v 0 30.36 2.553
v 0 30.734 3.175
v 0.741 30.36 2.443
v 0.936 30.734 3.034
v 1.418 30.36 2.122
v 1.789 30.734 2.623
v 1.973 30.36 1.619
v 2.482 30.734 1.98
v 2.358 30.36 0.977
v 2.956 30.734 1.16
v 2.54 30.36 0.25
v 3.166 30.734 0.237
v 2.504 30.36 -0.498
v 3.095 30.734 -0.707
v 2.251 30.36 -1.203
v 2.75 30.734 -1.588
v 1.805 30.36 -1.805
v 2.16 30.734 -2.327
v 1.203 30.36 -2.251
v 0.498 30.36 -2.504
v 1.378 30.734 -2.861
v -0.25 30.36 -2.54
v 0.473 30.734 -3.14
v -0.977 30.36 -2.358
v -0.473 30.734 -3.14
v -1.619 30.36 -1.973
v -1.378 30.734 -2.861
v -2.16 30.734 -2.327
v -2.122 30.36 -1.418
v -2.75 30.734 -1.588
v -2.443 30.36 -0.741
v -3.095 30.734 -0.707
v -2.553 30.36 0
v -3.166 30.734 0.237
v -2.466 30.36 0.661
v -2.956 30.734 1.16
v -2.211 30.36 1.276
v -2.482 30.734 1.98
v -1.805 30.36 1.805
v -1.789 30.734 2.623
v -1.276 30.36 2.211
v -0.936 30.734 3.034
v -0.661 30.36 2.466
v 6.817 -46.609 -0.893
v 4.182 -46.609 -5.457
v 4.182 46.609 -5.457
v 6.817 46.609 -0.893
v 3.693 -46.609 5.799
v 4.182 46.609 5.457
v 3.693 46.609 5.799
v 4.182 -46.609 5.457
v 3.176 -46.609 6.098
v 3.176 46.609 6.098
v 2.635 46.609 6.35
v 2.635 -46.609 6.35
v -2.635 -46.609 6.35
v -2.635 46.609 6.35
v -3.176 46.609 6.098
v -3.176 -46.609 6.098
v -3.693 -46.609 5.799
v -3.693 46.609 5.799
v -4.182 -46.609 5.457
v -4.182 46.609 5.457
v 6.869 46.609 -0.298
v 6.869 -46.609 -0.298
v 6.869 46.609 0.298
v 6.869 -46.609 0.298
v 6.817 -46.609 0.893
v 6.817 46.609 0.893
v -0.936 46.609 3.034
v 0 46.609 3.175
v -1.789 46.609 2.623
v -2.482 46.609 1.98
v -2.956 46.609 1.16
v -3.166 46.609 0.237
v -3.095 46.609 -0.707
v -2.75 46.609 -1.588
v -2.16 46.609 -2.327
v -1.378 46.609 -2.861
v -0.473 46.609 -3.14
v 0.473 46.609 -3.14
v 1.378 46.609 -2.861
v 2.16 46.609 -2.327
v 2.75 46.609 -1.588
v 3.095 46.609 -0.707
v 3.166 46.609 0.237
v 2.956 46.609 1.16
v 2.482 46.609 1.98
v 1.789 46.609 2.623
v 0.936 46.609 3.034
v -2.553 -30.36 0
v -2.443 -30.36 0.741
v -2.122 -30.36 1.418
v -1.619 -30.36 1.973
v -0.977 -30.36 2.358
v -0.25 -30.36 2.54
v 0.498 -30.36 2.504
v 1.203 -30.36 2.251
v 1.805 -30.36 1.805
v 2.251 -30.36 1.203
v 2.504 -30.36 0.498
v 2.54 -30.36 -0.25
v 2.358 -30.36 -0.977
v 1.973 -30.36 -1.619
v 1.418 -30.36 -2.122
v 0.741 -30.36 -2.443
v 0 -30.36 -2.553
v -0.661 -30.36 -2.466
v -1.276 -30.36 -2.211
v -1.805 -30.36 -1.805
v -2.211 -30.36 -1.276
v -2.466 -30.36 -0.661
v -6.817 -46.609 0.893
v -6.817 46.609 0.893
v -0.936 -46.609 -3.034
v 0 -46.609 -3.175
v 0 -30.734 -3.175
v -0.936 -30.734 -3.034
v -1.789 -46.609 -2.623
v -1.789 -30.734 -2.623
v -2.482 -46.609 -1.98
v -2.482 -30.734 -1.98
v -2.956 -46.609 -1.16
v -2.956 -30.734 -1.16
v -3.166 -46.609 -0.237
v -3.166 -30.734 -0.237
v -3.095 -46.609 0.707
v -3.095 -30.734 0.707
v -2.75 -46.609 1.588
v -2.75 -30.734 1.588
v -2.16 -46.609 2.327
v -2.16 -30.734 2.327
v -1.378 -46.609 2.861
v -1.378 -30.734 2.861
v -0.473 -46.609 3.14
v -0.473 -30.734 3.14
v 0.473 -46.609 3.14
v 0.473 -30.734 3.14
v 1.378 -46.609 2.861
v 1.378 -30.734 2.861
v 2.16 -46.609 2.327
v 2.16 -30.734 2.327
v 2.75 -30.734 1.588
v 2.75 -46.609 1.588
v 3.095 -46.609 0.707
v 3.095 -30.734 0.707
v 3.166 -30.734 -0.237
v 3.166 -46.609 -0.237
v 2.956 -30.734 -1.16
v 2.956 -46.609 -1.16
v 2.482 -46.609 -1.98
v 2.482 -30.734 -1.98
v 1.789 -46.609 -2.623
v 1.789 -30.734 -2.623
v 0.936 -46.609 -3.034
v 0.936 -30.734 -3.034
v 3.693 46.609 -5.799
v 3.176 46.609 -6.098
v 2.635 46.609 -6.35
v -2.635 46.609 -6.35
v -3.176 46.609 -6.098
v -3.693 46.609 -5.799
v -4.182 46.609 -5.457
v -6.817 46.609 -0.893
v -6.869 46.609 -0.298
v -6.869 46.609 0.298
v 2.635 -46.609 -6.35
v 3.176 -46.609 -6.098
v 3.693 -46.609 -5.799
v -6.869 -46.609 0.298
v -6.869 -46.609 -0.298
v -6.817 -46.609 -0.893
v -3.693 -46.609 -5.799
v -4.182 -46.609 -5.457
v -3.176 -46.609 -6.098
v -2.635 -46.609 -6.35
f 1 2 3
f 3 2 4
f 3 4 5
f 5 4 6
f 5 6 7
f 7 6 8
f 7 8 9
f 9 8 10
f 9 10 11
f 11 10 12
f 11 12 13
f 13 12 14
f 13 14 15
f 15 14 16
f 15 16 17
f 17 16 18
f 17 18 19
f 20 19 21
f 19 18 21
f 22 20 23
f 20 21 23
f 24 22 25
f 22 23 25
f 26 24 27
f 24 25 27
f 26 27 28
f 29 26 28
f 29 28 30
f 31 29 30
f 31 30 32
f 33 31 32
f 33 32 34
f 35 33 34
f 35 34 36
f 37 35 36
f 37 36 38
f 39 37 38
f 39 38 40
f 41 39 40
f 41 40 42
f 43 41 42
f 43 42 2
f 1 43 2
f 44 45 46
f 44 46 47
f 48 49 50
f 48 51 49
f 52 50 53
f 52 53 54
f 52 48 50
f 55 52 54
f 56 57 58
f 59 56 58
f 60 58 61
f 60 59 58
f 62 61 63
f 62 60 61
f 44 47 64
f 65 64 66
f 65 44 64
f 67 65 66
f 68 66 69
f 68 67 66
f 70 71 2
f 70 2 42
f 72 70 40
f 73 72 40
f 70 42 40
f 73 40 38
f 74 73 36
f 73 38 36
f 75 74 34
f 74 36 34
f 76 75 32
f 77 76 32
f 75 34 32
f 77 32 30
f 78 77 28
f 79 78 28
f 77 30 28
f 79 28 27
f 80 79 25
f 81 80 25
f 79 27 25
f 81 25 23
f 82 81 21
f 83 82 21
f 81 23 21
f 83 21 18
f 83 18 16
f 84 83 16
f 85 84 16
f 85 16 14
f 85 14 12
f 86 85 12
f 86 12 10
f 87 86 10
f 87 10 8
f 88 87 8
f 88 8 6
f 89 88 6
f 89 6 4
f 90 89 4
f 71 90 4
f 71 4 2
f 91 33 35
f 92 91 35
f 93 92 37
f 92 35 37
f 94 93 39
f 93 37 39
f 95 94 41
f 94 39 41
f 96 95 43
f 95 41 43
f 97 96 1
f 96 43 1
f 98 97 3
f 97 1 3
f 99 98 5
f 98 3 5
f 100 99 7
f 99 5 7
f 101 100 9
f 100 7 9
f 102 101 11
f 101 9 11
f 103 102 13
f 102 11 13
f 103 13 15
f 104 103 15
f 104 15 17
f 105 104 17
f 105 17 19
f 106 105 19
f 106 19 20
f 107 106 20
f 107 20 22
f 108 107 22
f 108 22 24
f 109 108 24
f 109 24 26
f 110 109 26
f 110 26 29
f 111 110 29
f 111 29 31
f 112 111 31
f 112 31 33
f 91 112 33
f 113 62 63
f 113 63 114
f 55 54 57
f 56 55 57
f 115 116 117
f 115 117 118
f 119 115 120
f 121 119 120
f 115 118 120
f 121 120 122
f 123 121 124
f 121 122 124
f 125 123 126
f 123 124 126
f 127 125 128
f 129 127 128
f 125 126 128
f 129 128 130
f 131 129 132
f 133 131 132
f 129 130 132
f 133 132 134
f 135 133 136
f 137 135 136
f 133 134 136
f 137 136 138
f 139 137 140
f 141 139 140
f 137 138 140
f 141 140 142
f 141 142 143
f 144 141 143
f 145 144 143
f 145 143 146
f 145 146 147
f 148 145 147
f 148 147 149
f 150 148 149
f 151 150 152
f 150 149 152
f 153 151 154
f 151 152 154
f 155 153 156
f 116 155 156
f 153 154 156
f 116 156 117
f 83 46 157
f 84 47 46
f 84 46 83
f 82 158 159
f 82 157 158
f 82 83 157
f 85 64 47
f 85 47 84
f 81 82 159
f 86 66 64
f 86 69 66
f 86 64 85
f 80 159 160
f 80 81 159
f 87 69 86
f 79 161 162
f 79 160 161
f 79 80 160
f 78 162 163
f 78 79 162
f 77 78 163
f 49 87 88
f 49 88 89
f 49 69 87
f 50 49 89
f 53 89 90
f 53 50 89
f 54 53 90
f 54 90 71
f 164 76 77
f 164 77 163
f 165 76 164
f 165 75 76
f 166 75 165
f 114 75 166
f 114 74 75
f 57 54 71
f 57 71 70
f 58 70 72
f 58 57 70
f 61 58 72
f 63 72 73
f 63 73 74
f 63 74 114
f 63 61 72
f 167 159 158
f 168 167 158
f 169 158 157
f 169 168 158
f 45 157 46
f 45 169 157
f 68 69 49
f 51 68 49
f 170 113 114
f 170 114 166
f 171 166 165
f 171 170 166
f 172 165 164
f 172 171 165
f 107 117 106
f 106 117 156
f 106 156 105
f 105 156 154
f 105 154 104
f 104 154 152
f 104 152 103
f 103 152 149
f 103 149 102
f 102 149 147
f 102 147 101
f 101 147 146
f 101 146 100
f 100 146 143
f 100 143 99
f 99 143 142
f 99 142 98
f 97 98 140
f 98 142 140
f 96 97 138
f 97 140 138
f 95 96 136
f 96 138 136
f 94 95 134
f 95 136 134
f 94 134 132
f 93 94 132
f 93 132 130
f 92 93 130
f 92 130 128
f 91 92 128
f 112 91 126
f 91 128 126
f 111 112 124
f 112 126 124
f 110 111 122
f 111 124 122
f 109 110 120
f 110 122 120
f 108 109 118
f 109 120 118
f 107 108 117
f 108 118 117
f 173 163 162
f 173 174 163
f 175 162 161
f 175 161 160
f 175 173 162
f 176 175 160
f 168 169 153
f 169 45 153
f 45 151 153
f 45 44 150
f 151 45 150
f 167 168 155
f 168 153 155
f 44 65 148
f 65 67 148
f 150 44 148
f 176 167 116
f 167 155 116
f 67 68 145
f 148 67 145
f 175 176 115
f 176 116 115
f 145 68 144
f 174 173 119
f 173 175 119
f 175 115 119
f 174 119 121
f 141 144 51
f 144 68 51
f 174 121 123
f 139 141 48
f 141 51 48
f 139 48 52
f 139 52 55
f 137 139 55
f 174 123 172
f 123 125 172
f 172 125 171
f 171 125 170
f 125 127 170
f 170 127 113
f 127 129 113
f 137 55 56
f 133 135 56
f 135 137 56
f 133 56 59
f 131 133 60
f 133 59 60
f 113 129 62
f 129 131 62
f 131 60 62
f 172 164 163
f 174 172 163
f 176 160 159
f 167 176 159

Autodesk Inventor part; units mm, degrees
ref_plane "YZ Plane" through (0, 0, 0) normal (1, 0, 0) x (0, 1, 0)
ref_plane "XZ Plane" through (0, 0, 0) normal (0, 1, 0) x (-1, 0, 0)
ref_plane "XY Plane" through (0, 0, 0) normal (0, 0, 1) x (1, 0, 0)
sketch "Sketch1" plane through (0, 0, 0) normal (0, 1, 0) x (-1, 0, 0)
  line L0 (-7.3323, 0) -> (-3.6662, 6.35)
  line L1 (-3.6662, 6.35) -> (3.6662, 6.35)
  line L2 (3.6662, 6.35) -> (7.3323, 0)
  line L3 (7.3323, 0) -> (3.6662, -6.35)
  line L4 (3.6662, -6.35) -> (-3.6662, -6.35)
  line L5 (-3.6662, -6.35) -> (-7.3323, 0)
  circle A0 centre (0, 0) radius 6.875
  circle A1 centre (0, 0) radius 6.35
  line L6 (-2.7496, -4.7625) -> (2.7496, -4.7625)
  line L7 (2.7496, -4.7625) -> (5.4993, 0)
  line L8 (5.4993, 0) -> (2.7496, 4.7625)
  line L9 (2.7496, 4.7625) -> (-2.7496, 4.7625)
  line L10 (-2.7496, 4.7625) -> (-5.4993, 0)
  line L11 (-5.4993, 0) -> (-2.7496, -4.7625)
  circle A2 centre (0, 0) radius 4.7625
  circle A3 centre (0, 0) radius 5.125
  circle A4 centre (0, 0) radius 9.525
  circle A5 centre (0, 0) radius 5.9436
  circle A6 centre (0, 0) radius 2.5527
  circle A7 centre (0, 0) radius 2.0193
  circle A8 centre (0, 0) radius 3.175
  circle A9 centre (0, 0) radius 8.7313
  point P0 (-4.1818, 5.457)
  point P1 (-2.635, 6.35)
  point P2 (-6.8168, -0.893)
  point P3 (-6.8168, 0.893)
  point P4 (-2.635, -6.35)
  point P5 (-4.1818, -5.457)
  point P6 (4.1818, -5.457)
  point P7 (2.635, -6.35)
  point P8 (6.8168, -0.893)
  point P9 (6.8168, 0.893)
  point P10 (2.635, 6.35)
  point P11 (4.1818, 5.457)
  point P12 (3.1778, -4.0208)
  point P13 (1.8932, -4.7625)
  point P14 (5.071, -0.7417)
  point P15 (5.071, 0.7417)
  point P16 (1.8932, 4.7625)
  point P17 (3.1778, 4.0208)
  point P18 (-3.1778, 4.0208)
  point P19 (-1.8932, 4.7625)
  point P20 (-5.071, -0.7417)
  point P21 (-5.071, 0.7417)
  point P22 (-1.8932, -4.7625)
  point P23 (-3.1778, -4.0208)
  dimension "d0" = 12.7
  dimension "d1" = 13.75
  dimension "d2" = 12.7
  dimension "d3" = 9.525
  dimension "d4" = 10.25
  dimension "d5" = 19.05
  dimension "d6" = 11.8872
  dimension "d7" = 5.1054
  dimension "d8" = 4.0386
  dimension "d9" = 6.35
  dimension "d153" = 0.7937
extrude "BaseProfile625Round" add sketch "Sketch1" along normal mid plane 93.218 contours L0 A0 L5 | A0 L0 | L0 A1 L5 A0 | L5 A0 | L0 A0 L1 A1 | A1 | L0 L1 A0 | A1 L4 A0 L5 | A0 L4 L5 | L1 A0 | L1 A0 L2 A1 | A1 L3 A0 L4 | L4 A0 | L1 L2 A0 | L2 A0 | L2 A0 L3 A1 | A0 L3 L4 | L3 A0 | L2 L3 A0 | L11 A3 L6 | A3 L11 A2 L6 | L6 A3 | A3 L11 | A2 L7 A3 L6 | A2 | A3 L7 L6 | L11 A3 L10 A2 | L11 L10 A3 | L7 A3 | A2 L8 A3 L7 | L10 A3 | L10 A3 L9 A2 | A3 L8 L7 | L10 L9 A3 | L9 A3 | L9 A3 L8 A2 | L8 A3 | L9 L8 A3 | A4 | A5 | A6 | A7 | A8 | A9
extrude "BaseProfileRoundTube" [suppressed]
extrude "BaseProfile500Hex" [suppressed]
extrude "BaseProfile500Thunderhex" cut sketch "Sketch1" along normal mid plane 914.4 contours L0 A0 L5 | A0 L0 | L5 A0 | L0 L1 A0 | A0 L4 L5 | L1 A0 | L4 A0 | L1 L2 A0 | L2 A0 | A0 L3 L4 | L3 A0 | L2 L3 A0 | A4 | A9
extrude "BaseProfile500Round" [suppressed]
extrude "BaseProfile375Hex" [suppressed]
extrude "BaseProfile375Thunderhex" [suppressed]
extrude "BaseProfile375Round" [suppressed]
extrude "TopShaftProfile1Hex500" [suppressed]
extrude "TopShaftProfile1ThunderHex500" [suppressed]
extrude "TopShaftProfile1Round500" [suppressed]
extrude "TopShaftProfile1Hex375" [suppressed]
extrude "TopShaftProfile1ThunderHex375" [suppressed]
extrude "TopShaftProfile1Round375" [suppressed]
extrude "TopShaftProfile2ThunderHex500" [suppressed]
extrude "TopShaftProfile2Round500" [suppressed]
extrude "TopShaftProfile2Hex375" [suppressed]
extrude "TopShaftProfile2ThunderHex375" [suppressed]
extrude "TopShaftProfile2Round375" [suppressed]
sketch "Sketch2" plane through (0, 0, 0) normal (1, 0, 0) x (0, 1, 0)
  line L0 (-40.8112, 0) -> (47.9537, 0) projected
  line L1 (0, -2.6658) -> (0, 15.9951) projected
  line L2 (53.7515, 4.4704) -> (54.8945, 4.4704)
  line L3 (54.8945, 4.4704) -> (54.8945, 4.7625)
  line L4 (54.8945, 4.7625) -> (55.974, 4.7625)
  line L5 (55.974, 4.7625) -> (56.482, 4.2545)
  line L6 (56.482, 4.2545) -> (56.482, 0)
  line L7 (53.7515, 4.4704) -> (53.7515, 0) construction
  line L8 (53.7515, 4.4704) -> (53.7515, 4.7625)
  line L9 (53.7515, 4.7625) -> (46.609, 4.7625)
  line L10 (46.609, 4.7625) -> (46.609, 0)
  line L11 (46.609, 0) -> (56.482, 0)
  line L12 (-46.609, 5.9436) -> (-47.752, 5.9436)
  line L13 (-47.752, 5.9436) -> (-47.752, 6.35)
  line L14 (-47.752, 6.35) -> (-48.8315, 6.35)
  line L15 (-48.8315, 6.35) -> (-49.3395, 5.842)
  line L16 (-49.3395, 5.842) -> (-49.3395, 0)
  line L17 (-46.609, 5.9436) -> (-46.609, 0) construction
  line L18 (-46.609, 5.9436) -> (-46.609, 6.35)
  line L19 (-46.609, 6.35) -> (-46.609, 6.35)
  line L20 (-46.609, 6.35) -> (-46.609, 0)
  line L21 (-46.609, 0) -> (-49.3395, 0)
  line L22 (0, 0) -> (0, 13.3292)
  line L23 (46.609, 0) -> (46.609, 4.7625)
  point P0 (25.4, 5.9436)
  point P1 (-49.3395, 0)
  point P2 (-46.609, 0)
  point P3 (30.955, 4.7625)
  point P4 (-17.4625, 6.2865)
  point P5 (25.4, 4.7625)
  point P6 (19.4005, 4.7625)
  point P7 (-25.4, 4.7625)
  point P8 (-26.543, 4.7625)
  dimension "TopBearingRoundDia2" = 9.525
  dimension "d65" = 45
  dimension "RetainingRingChamferSize2" = 0.508
  dimension "d72" = 46.609
  dimension "TopSnapRingDia2" = 8.9408
  dimension "d119" = 0.508
  dimension "d120" = 45
  dimension "d135" = 46.609
  dimension "d138" = 56.482
  dimension "d139" = 54.8945
  dimension "d140" = 53.7515
  dimension "d141" = 11.8872
  dimension "d142" = 12.7
  dimension "d143" = 47.752
  dimension "d144" = 46.609
  dimension "d145" = 49.3395
revolve "TopRetentionGroove&BearingRound" [suppressed]
sketch "Sketch3" plane through (0, 46.609, 0) normal (0, 1, 0) x (1, 0, 0)
  point P0 (0, 0)
  point P1 (0, 0)
hole "TopShaftTappedHole" at (0, 46.609, 0) direction (0, -1, 0) diameter 6.35 depth 15.875 tip angle 118
thread "TopShaftThread" size "1/4-20 UNC" class "2B" standard "ANSI Unified Screw Threads" length 12.7
extrude "BottomShaftProfile1Hex500" [suppressed]
extrude "BottomShaftProfile1ThunderHex500" [suppressed]
extrude "BottomShaftProfile1Round500" [suppressed]
extrude "BottomShaftProfile1Hex375" [suppressed]
extrude "BottomShaftProfile1ThunderHex375" [suppressed]
extrude "BottomShaftProfile2ThunderHex500" [suppressed]
extrude "BottomShaftProfile1Round375" [suppressed]
extrude "BottomShaftProfile2Round500" [suppressed]
extrude "BottomShaftProfile2Hex375" [suppressed]
extrude "BottomShaftProfile2ThunderHex375" [suppressed]
extrude "BottomShaftProfile2Round375" [suppressed]
sketch "Sketch4" plane through (0, -46.609, 0) normal (0, -1, 0) x (1, 0, 0)
  point P0 (0, 0)
  point P1 (0, 0)
hole "BottomShaftTappedHole" at (0, -46.609, 0) direction (0, 1, 0) diameter 6.35 depth 15.875 tip angle 118
thread "BottomShaftThread" size "1/4-20 UNC" class "2B" standard "ANSI Unified Screw Threads" length 12.7
revolve "BottomRetentionGroove&BearingRound" [suppressed]
extrude "BaseProfile375ThunderhexHole" [suppressed]
extrude "BaseProfile500ThunderhexHole" cut sketch "Sketch1" along normal mid plane 914.4 contours A6 | A7
equation "\"d18\" = BottomShaftProfile1Depth + TopShaftProfile1Depth + BaseShaftLength + TopShaftProfile2Depth + BottomShaftProfile2Depth"
equation "\"d72\" = 0.5 * d18"
equation "\"BaseShaftLength\" = 93.218"
equation "\"TopShaftProfile1Depth\" = 0"
equation "\"TopShaftProfile2Depth\" = 0"
equation "\"BottomShaftProfile1Depth\" = 0"
equation "\"BottomShaftProfile2Depth\" = 0"
equation "\"TopShaftHoleDia\" = 6.35"
equation "\"BottomShaftHoleDia\" = 6.35"
equation "\"TopBearingRoundDia\" = 9.525"
equation "\"TopGrooveWidth\" = 1.143"
equation "\"TopBearingRoundDistance\" = 7.14248"
equation "\"TopSnapRingDia\" = 8.9408"
equation "\"BottomBearingRoundDia\" = 12.7"
equation "\"BottomGrooveWidth\" = 1.143"
equation "\"BottomBearingRoundDistance\" = 0"
equation "\"BottomSnapRingDia\" = 11.8872"
equation "\"RoundTubeDia\" = 19.05"
properties part number "GreyT Claw 2 Pivot Shaft" material "Aluminum 6061"
